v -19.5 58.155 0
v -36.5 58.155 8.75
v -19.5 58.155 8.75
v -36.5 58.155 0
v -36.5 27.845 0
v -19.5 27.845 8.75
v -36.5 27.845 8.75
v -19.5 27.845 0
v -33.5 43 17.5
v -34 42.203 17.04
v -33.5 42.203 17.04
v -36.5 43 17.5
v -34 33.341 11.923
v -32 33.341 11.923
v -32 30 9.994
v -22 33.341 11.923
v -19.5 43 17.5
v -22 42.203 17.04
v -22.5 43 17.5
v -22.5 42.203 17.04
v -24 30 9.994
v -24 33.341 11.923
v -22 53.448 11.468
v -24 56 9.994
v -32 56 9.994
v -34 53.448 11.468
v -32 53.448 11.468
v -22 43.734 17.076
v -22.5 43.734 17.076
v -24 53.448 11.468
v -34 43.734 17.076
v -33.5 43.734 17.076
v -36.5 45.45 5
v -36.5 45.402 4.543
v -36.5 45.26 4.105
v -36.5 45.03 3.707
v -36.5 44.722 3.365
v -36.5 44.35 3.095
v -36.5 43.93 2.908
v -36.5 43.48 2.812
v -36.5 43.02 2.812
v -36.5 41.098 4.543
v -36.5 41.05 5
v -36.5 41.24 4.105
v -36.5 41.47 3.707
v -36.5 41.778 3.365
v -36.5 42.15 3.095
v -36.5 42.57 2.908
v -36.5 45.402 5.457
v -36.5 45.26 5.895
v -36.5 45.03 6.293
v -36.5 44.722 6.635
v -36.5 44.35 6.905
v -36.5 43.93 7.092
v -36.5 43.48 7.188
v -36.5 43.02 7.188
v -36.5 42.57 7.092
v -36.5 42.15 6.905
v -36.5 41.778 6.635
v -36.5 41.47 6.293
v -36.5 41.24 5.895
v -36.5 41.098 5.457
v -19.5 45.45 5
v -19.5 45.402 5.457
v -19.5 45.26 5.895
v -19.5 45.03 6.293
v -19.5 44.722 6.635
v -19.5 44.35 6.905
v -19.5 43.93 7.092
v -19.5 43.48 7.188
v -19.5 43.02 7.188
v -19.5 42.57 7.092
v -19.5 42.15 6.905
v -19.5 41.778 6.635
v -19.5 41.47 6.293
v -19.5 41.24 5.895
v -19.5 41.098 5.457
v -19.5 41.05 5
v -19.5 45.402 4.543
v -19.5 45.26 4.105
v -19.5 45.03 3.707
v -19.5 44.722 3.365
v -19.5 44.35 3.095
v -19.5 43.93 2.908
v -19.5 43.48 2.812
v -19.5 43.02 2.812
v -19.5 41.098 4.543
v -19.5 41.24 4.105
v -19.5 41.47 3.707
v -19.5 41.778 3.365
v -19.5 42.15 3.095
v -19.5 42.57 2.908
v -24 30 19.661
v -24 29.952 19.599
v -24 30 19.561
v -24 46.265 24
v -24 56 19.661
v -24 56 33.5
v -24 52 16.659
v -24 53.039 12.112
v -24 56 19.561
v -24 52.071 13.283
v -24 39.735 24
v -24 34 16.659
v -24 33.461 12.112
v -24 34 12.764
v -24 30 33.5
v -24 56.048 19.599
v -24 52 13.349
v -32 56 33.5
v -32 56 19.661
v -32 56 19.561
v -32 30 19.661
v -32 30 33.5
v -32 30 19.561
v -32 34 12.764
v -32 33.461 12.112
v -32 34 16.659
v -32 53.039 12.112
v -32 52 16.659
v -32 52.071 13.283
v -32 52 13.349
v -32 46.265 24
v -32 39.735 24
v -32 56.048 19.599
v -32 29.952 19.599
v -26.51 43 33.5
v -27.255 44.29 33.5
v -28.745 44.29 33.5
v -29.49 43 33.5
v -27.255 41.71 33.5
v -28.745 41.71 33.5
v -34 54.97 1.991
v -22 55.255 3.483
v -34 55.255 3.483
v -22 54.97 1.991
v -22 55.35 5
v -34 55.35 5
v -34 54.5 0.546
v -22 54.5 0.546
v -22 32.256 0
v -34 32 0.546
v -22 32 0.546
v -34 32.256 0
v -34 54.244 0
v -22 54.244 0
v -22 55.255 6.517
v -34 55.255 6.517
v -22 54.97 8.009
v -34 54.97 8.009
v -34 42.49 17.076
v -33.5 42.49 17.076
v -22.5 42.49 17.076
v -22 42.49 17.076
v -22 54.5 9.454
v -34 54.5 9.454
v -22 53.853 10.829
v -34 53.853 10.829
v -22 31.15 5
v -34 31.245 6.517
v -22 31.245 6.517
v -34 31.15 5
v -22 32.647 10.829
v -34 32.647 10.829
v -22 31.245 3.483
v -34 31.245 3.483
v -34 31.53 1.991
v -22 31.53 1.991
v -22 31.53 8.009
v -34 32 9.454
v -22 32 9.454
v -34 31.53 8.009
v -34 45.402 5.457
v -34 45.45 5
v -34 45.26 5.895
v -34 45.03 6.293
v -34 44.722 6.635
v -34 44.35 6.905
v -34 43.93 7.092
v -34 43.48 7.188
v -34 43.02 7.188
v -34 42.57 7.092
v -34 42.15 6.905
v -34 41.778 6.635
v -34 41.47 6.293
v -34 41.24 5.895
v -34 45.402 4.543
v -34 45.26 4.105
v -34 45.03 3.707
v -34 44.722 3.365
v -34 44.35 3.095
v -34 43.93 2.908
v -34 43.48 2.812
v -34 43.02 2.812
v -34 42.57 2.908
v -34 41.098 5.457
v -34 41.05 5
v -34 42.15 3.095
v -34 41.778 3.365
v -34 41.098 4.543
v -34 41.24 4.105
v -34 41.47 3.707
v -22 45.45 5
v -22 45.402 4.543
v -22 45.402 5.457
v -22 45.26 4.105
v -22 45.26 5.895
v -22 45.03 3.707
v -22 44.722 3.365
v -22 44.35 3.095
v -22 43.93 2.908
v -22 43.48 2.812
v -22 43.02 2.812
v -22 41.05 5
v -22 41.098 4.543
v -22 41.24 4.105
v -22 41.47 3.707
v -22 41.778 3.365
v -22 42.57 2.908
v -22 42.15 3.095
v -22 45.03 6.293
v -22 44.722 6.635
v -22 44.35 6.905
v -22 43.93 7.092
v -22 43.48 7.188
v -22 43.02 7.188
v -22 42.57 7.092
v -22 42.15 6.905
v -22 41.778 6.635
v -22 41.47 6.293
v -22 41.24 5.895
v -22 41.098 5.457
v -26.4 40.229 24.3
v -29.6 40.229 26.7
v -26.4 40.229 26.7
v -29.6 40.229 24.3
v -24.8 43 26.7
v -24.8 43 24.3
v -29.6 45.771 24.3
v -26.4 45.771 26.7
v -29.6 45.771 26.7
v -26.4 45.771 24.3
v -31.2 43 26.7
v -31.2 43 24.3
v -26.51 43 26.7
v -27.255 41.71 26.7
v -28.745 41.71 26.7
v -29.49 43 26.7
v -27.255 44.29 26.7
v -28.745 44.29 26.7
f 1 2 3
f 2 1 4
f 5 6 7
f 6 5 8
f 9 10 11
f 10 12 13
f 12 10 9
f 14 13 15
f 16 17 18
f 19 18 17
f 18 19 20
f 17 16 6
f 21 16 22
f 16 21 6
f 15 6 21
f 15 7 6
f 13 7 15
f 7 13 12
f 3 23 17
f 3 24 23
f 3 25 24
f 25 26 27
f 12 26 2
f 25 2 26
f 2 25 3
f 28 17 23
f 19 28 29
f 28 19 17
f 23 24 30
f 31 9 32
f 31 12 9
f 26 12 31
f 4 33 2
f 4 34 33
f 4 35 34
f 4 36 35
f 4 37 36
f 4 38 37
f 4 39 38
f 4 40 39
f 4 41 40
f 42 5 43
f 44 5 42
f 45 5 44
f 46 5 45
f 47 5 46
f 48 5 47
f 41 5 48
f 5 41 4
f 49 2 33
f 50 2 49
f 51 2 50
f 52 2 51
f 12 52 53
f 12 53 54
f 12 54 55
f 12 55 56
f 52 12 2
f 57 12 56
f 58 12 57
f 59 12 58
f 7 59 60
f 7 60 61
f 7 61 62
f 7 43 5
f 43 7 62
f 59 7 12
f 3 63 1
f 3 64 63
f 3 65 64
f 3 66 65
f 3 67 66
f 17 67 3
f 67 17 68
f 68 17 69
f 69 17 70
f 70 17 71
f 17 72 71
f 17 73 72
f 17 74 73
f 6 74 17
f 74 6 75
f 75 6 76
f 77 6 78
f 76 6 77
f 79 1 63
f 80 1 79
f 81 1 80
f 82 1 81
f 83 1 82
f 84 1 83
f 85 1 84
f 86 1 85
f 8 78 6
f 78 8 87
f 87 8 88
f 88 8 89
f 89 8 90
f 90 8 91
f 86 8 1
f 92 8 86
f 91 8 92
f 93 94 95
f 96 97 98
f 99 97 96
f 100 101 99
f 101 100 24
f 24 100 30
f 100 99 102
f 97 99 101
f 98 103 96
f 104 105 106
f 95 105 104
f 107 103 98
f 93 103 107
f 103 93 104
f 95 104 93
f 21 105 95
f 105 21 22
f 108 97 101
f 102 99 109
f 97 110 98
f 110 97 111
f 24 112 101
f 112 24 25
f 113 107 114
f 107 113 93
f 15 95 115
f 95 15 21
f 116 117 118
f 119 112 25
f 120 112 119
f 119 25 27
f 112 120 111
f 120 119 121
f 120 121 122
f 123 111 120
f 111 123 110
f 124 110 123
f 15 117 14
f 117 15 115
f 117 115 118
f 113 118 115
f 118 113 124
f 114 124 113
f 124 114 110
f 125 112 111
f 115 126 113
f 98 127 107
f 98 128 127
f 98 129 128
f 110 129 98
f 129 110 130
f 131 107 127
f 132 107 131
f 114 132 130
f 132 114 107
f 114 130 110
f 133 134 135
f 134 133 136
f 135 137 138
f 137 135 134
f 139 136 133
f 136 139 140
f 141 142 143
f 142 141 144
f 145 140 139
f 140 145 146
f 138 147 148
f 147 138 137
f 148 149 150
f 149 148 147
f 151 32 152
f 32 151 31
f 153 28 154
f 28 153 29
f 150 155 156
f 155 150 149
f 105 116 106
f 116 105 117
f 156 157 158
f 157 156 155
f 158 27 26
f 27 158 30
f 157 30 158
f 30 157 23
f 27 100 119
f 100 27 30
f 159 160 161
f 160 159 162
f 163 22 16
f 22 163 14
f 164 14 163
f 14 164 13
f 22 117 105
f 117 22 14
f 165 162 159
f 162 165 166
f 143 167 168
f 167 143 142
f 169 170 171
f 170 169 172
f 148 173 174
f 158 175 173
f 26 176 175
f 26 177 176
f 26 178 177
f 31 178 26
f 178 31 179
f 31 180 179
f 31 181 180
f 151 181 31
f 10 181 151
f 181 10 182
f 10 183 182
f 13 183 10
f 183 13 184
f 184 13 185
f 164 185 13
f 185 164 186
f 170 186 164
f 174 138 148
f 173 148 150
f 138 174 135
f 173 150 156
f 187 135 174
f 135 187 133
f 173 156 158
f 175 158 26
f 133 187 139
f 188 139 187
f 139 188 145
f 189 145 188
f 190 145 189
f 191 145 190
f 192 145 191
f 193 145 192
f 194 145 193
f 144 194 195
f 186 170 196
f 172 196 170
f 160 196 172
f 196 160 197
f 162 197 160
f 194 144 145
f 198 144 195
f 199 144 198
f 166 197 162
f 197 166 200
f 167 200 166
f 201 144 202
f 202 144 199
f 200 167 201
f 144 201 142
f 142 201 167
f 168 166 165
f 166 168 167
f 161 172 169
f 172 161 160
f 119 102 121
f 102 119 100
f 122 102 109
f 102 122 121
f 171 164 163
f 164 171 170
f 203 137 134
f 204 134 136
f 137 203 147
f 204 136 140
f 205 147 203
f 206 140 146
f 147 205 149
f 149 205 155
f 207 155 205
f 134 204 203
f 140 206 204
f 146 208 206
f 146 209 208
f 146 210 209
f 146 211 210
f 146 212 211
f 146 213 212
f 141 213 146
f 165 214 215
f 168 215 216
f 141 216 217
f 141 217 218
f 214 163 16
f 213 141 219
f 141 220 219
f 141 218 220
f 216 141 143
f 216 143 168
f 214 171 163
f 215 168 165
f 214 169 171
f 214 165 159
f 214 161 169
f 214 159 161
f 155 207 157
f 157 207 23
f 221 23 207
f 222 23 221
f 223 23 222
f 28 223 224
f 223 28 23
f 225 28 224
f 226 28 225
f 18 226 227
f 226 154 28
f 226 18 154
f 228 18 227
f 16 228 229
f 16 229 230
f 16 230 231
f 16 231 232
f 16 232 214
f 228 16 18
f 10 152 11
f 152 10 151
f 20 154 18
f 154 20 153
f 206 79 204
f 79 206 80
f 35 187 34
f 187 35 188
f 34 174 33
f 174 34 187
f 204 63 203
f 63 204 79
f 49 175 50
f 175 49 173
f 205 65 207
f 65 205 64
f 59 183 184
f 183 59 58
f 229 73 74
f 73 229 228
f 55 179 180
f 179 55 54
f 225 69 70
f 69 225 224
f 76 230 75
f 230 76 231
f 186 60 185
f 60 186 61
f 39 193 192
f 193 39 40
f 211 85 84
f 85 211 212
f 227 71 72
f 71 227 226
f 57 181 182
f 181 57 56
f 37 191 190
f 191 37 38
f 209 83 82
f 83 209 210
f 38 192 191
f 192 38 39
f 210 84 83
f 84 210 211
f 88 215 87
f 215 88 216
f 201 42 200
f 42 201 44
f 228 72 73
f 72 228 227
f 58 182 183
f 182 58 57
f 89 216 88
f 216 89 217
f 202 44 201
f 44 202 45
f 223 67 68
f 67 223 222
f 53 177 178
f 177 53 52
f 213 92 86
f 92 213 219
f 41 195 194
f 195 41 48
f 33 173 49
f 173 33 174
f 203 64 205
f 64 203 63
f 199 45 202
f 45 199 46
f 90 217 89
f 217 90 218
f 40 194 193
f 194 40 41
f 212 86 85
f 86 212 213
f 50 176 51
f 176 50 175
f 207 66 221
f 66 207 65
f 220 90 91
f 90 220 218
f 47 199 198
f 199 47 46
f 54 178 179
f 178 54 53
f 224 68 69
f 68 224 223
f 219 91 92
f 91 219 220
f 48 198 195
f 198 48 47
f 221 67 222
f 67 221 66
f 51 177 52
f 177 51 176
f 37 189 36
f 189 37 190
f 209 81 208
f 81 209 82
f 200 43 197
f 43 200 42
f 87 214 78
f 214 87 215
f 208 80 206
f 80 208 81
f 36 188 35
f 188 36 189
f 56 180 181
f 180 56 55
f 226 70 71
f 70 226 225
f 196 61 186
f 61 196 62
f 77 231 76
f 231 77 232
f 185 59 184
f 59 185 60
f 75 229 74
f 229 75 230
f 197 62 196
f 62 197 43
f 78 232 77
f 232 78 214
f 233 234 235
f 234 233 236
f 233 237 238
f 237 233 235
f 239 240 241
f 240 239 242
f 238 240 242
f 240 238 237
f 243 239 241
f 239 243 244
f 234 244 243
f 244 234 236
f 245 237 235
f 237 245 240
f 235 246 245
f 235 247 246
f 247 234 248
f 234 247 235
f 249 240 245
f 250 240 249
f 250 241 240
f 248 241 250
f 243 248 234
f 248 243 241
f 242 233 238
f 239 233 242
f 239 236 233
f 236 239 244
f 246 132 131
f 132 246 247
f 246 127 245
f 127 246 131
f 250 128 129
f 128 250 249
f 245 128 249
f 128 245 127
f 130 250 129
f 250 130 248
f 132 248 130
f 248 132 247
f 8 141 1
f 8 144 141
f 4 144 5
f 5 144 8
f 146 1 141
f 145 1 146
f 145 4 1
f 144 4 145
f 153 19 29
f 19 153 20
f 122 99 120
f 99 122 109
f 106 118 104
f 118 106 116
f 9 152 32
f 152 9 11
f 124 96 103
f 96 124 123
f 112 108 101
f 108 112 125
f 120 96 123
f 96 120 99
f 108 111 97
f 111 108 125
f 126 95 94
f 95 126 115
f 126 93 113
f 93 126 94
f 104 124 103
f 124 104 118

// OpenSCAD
// file: inc/nuts_and_bolts.scad
// Copyright 2010 D1plo1d

// This library is dual licensed under the GPL 3.0 and the GNU Lesser General Public License as per http://creativecommons.org/licenses/LGPL/2.1/ .

//testNutsAndBolts();

module SKIPtestNutsAndBolts()
{
	$fn = 360;
	translate([0,15])nutHole(3, proj=2);
	boltHole(3, length= 30, proj=2);
}

MM = "mm";
INCH = "inch"; //Not yet supported

//Based on: http://www.roymech.co.uk/Useful_Tables/Screws/Hex_Screws.htm
METRIC_NUT_AC_WIDTHS =
[
	-1, //0 index is not used but reduces computation
	-1,
	-1,
	6.40,//m3
	8.10,//m4
	9.20,//m5
	11.50,//m6
	-1,
	15.00,//m8
	-1,
	19.60,//m10
	-1,
	22.10,//m12
	-1,
	-1,
	-1,
	27.70,//m16
	-1,
	-1,
	-1,
	34.60,//m20
	-1,
	-1,
	-1,
	41.60,//m24
	-1,
	-1,
	-1,
	-1,
	-1,
	53.1,//m30
	-1,
	-1,
	-1,
	-1,
	-1,
	63.5//m36
];
METRIC_NUT_THICKNESS =
[
	-1, //0 index is not used but reduces computation
	-1,
	-1,
	2.40,//m3
	3.20,//m4
	4.00,//m5
	5.00,//m6
	-1,
	6.50,//m8
	-1,
	8.00,//m10
	-1,
	10.00,//m12
	-1,
	-1,
	-1,
	13.00,//m16
	-1,
	-1,
	-1,
	16.00//m20
	-1,
	-1,
	-1,
	19.00,//m24
	-1,
	-1,
	-1,
	-1,
	-1,
	24.00,//m30
	-1,
	-1,
	-1,
	-1,
	-1,
	29.00//m36
];

COURSE_METRIC_BOLT_MAJOR_THREAD_DIAMETERS =
[//based on max values
	-1, //0 index is not used but reduces computation
	-1,
	-1,
	2.98,//m3
	3.978,//m4
	4.976,//m5
	5.974,//m6
	-1,
	7.972,//m8
	-1,
	9.968,//m10
	-1,
	11.966,//m12
	-1,
	-1,
	-1,
	15.962,//m16
	-1,
	-1,
	-1,
	19.958,//m20
	-1,
	-1,
	-1,
	23.952,//m24
	-1,
	-1,
	-1,
	-1,
	-1,
	29.947,//m30
	-1,
	-1,
	-1,
	-1,
	-1,
	35.940//m36
];

module nutHole(size, units=MM, tolerance = +0.0001, proj = -1)
{
	//takes a metric screw/nut size and looksup nut dimensions
	radius = METRIC_NUT_AC_WIDTHS[size]/2+tolerance;
	height = METRIC_NUT_THICKNESS[size]+tolerance;
	if (proj == -1)
	{
		cylinder(r= radius, h=height, $fn = 6, center=[0,0]);
	}
	if (proj == 1)
	{
		circle(r= radius, $fn = 6);
	}
	if (proj == 2)
	{
		translate([-radius/2, 0])
			square([radius*2, height]);
	}
}

module boltHole(size, units=MM, length, tolerance = +0.0001, proj = -1)
{
	radius = COURSE_METRIC_BOLT_MAJOR_THREAD_DIAMETERS[size]/2+tolerance;
//TODO: proper screw cap values
	capHeight = METRIC_NUT_THICKNESS[size]+tolerance; //METRIC_BOLT_CAP_HEIGHTS[size]+tolerance;
	capRadius = METRIC_NUT_AC_WIDTHS[size]/2+tolerance; //METRIC_BOLT_CAP_RADIUS[size]+tolerance;

	if (proj == -1)
	{
	translate([0, 0, -capHeight])
		cylinder(r= capRadius, h=capHeight);
	cylinder(r = radius, h = length);
	}
	if (proj == 1)
	{
		circle(r = radius);
	}
	if (proj == 2)
	{
		translate([-capRadius/2, -capHeight])
			square([capRadius*2, capHeight]);
		square([radius*2, length]);
	}
}
// main file
// PRUSA iteration3
// X end idler
// GNU GPL v3
// Josef Průša <iam@josefprusa.cz> and contributors
// http://www.reprap.org/wiki/Prusa_Mendel
// http://prusamendel.org

use <inc/nuts_and_bolts.scad>

module x_end_idler_jmmp_b(){
$fn=6;
	difference(){
		union(){
			translate(v=[-5.5,30,30]) rotate(a=[0,-90,0]) rotate(a=[0,0,90]) cylinder(h = 17, r=17.5, $fn=6);
			translate(v=[-5.5-10+1.5,13,30]) cube(size = [8,39-6,26], center = true);


		}
		translate(v=[-30,30,0])cube([30,30,60]);
		translate(v=[-14,25,30.25]) rotate(a=[0,-90,0]) X_end_I_B_holes();
		translate(v=[-5.5-10+1.5,13,30]) cube(size = [11,20-6,18], center = true);
		translate(v=[-5.5-10+1.5,3.3,30])rotate(a=[90,0,0]) boltHole(3, length = 100);//3.3
	}
	translate(v=[-14,8,38])rotate(a=[-52,0,0])cube(size = [8,5,10], center = true);
	translate(v=[-14,8,22])rotate(a=[52,0,0])cube(size = [8,5,10], center = true);
}


module X_end_I_B_holes(){
	wall= 1.2;
	clearence= 2; //0.1; 
	cylinder(r=6.5+wall+clearence+2*wall, h=9+3, $fn=50,center=true);
	cylinder(h = 80, r=2.2, $fn=30,center=true);

}


translate(v=[-5.5-10+1.5,13,30])rotate(a=[-90,0,0])x_end_idler_jmmp_b();


//x_end_idler_jmmp_b();
